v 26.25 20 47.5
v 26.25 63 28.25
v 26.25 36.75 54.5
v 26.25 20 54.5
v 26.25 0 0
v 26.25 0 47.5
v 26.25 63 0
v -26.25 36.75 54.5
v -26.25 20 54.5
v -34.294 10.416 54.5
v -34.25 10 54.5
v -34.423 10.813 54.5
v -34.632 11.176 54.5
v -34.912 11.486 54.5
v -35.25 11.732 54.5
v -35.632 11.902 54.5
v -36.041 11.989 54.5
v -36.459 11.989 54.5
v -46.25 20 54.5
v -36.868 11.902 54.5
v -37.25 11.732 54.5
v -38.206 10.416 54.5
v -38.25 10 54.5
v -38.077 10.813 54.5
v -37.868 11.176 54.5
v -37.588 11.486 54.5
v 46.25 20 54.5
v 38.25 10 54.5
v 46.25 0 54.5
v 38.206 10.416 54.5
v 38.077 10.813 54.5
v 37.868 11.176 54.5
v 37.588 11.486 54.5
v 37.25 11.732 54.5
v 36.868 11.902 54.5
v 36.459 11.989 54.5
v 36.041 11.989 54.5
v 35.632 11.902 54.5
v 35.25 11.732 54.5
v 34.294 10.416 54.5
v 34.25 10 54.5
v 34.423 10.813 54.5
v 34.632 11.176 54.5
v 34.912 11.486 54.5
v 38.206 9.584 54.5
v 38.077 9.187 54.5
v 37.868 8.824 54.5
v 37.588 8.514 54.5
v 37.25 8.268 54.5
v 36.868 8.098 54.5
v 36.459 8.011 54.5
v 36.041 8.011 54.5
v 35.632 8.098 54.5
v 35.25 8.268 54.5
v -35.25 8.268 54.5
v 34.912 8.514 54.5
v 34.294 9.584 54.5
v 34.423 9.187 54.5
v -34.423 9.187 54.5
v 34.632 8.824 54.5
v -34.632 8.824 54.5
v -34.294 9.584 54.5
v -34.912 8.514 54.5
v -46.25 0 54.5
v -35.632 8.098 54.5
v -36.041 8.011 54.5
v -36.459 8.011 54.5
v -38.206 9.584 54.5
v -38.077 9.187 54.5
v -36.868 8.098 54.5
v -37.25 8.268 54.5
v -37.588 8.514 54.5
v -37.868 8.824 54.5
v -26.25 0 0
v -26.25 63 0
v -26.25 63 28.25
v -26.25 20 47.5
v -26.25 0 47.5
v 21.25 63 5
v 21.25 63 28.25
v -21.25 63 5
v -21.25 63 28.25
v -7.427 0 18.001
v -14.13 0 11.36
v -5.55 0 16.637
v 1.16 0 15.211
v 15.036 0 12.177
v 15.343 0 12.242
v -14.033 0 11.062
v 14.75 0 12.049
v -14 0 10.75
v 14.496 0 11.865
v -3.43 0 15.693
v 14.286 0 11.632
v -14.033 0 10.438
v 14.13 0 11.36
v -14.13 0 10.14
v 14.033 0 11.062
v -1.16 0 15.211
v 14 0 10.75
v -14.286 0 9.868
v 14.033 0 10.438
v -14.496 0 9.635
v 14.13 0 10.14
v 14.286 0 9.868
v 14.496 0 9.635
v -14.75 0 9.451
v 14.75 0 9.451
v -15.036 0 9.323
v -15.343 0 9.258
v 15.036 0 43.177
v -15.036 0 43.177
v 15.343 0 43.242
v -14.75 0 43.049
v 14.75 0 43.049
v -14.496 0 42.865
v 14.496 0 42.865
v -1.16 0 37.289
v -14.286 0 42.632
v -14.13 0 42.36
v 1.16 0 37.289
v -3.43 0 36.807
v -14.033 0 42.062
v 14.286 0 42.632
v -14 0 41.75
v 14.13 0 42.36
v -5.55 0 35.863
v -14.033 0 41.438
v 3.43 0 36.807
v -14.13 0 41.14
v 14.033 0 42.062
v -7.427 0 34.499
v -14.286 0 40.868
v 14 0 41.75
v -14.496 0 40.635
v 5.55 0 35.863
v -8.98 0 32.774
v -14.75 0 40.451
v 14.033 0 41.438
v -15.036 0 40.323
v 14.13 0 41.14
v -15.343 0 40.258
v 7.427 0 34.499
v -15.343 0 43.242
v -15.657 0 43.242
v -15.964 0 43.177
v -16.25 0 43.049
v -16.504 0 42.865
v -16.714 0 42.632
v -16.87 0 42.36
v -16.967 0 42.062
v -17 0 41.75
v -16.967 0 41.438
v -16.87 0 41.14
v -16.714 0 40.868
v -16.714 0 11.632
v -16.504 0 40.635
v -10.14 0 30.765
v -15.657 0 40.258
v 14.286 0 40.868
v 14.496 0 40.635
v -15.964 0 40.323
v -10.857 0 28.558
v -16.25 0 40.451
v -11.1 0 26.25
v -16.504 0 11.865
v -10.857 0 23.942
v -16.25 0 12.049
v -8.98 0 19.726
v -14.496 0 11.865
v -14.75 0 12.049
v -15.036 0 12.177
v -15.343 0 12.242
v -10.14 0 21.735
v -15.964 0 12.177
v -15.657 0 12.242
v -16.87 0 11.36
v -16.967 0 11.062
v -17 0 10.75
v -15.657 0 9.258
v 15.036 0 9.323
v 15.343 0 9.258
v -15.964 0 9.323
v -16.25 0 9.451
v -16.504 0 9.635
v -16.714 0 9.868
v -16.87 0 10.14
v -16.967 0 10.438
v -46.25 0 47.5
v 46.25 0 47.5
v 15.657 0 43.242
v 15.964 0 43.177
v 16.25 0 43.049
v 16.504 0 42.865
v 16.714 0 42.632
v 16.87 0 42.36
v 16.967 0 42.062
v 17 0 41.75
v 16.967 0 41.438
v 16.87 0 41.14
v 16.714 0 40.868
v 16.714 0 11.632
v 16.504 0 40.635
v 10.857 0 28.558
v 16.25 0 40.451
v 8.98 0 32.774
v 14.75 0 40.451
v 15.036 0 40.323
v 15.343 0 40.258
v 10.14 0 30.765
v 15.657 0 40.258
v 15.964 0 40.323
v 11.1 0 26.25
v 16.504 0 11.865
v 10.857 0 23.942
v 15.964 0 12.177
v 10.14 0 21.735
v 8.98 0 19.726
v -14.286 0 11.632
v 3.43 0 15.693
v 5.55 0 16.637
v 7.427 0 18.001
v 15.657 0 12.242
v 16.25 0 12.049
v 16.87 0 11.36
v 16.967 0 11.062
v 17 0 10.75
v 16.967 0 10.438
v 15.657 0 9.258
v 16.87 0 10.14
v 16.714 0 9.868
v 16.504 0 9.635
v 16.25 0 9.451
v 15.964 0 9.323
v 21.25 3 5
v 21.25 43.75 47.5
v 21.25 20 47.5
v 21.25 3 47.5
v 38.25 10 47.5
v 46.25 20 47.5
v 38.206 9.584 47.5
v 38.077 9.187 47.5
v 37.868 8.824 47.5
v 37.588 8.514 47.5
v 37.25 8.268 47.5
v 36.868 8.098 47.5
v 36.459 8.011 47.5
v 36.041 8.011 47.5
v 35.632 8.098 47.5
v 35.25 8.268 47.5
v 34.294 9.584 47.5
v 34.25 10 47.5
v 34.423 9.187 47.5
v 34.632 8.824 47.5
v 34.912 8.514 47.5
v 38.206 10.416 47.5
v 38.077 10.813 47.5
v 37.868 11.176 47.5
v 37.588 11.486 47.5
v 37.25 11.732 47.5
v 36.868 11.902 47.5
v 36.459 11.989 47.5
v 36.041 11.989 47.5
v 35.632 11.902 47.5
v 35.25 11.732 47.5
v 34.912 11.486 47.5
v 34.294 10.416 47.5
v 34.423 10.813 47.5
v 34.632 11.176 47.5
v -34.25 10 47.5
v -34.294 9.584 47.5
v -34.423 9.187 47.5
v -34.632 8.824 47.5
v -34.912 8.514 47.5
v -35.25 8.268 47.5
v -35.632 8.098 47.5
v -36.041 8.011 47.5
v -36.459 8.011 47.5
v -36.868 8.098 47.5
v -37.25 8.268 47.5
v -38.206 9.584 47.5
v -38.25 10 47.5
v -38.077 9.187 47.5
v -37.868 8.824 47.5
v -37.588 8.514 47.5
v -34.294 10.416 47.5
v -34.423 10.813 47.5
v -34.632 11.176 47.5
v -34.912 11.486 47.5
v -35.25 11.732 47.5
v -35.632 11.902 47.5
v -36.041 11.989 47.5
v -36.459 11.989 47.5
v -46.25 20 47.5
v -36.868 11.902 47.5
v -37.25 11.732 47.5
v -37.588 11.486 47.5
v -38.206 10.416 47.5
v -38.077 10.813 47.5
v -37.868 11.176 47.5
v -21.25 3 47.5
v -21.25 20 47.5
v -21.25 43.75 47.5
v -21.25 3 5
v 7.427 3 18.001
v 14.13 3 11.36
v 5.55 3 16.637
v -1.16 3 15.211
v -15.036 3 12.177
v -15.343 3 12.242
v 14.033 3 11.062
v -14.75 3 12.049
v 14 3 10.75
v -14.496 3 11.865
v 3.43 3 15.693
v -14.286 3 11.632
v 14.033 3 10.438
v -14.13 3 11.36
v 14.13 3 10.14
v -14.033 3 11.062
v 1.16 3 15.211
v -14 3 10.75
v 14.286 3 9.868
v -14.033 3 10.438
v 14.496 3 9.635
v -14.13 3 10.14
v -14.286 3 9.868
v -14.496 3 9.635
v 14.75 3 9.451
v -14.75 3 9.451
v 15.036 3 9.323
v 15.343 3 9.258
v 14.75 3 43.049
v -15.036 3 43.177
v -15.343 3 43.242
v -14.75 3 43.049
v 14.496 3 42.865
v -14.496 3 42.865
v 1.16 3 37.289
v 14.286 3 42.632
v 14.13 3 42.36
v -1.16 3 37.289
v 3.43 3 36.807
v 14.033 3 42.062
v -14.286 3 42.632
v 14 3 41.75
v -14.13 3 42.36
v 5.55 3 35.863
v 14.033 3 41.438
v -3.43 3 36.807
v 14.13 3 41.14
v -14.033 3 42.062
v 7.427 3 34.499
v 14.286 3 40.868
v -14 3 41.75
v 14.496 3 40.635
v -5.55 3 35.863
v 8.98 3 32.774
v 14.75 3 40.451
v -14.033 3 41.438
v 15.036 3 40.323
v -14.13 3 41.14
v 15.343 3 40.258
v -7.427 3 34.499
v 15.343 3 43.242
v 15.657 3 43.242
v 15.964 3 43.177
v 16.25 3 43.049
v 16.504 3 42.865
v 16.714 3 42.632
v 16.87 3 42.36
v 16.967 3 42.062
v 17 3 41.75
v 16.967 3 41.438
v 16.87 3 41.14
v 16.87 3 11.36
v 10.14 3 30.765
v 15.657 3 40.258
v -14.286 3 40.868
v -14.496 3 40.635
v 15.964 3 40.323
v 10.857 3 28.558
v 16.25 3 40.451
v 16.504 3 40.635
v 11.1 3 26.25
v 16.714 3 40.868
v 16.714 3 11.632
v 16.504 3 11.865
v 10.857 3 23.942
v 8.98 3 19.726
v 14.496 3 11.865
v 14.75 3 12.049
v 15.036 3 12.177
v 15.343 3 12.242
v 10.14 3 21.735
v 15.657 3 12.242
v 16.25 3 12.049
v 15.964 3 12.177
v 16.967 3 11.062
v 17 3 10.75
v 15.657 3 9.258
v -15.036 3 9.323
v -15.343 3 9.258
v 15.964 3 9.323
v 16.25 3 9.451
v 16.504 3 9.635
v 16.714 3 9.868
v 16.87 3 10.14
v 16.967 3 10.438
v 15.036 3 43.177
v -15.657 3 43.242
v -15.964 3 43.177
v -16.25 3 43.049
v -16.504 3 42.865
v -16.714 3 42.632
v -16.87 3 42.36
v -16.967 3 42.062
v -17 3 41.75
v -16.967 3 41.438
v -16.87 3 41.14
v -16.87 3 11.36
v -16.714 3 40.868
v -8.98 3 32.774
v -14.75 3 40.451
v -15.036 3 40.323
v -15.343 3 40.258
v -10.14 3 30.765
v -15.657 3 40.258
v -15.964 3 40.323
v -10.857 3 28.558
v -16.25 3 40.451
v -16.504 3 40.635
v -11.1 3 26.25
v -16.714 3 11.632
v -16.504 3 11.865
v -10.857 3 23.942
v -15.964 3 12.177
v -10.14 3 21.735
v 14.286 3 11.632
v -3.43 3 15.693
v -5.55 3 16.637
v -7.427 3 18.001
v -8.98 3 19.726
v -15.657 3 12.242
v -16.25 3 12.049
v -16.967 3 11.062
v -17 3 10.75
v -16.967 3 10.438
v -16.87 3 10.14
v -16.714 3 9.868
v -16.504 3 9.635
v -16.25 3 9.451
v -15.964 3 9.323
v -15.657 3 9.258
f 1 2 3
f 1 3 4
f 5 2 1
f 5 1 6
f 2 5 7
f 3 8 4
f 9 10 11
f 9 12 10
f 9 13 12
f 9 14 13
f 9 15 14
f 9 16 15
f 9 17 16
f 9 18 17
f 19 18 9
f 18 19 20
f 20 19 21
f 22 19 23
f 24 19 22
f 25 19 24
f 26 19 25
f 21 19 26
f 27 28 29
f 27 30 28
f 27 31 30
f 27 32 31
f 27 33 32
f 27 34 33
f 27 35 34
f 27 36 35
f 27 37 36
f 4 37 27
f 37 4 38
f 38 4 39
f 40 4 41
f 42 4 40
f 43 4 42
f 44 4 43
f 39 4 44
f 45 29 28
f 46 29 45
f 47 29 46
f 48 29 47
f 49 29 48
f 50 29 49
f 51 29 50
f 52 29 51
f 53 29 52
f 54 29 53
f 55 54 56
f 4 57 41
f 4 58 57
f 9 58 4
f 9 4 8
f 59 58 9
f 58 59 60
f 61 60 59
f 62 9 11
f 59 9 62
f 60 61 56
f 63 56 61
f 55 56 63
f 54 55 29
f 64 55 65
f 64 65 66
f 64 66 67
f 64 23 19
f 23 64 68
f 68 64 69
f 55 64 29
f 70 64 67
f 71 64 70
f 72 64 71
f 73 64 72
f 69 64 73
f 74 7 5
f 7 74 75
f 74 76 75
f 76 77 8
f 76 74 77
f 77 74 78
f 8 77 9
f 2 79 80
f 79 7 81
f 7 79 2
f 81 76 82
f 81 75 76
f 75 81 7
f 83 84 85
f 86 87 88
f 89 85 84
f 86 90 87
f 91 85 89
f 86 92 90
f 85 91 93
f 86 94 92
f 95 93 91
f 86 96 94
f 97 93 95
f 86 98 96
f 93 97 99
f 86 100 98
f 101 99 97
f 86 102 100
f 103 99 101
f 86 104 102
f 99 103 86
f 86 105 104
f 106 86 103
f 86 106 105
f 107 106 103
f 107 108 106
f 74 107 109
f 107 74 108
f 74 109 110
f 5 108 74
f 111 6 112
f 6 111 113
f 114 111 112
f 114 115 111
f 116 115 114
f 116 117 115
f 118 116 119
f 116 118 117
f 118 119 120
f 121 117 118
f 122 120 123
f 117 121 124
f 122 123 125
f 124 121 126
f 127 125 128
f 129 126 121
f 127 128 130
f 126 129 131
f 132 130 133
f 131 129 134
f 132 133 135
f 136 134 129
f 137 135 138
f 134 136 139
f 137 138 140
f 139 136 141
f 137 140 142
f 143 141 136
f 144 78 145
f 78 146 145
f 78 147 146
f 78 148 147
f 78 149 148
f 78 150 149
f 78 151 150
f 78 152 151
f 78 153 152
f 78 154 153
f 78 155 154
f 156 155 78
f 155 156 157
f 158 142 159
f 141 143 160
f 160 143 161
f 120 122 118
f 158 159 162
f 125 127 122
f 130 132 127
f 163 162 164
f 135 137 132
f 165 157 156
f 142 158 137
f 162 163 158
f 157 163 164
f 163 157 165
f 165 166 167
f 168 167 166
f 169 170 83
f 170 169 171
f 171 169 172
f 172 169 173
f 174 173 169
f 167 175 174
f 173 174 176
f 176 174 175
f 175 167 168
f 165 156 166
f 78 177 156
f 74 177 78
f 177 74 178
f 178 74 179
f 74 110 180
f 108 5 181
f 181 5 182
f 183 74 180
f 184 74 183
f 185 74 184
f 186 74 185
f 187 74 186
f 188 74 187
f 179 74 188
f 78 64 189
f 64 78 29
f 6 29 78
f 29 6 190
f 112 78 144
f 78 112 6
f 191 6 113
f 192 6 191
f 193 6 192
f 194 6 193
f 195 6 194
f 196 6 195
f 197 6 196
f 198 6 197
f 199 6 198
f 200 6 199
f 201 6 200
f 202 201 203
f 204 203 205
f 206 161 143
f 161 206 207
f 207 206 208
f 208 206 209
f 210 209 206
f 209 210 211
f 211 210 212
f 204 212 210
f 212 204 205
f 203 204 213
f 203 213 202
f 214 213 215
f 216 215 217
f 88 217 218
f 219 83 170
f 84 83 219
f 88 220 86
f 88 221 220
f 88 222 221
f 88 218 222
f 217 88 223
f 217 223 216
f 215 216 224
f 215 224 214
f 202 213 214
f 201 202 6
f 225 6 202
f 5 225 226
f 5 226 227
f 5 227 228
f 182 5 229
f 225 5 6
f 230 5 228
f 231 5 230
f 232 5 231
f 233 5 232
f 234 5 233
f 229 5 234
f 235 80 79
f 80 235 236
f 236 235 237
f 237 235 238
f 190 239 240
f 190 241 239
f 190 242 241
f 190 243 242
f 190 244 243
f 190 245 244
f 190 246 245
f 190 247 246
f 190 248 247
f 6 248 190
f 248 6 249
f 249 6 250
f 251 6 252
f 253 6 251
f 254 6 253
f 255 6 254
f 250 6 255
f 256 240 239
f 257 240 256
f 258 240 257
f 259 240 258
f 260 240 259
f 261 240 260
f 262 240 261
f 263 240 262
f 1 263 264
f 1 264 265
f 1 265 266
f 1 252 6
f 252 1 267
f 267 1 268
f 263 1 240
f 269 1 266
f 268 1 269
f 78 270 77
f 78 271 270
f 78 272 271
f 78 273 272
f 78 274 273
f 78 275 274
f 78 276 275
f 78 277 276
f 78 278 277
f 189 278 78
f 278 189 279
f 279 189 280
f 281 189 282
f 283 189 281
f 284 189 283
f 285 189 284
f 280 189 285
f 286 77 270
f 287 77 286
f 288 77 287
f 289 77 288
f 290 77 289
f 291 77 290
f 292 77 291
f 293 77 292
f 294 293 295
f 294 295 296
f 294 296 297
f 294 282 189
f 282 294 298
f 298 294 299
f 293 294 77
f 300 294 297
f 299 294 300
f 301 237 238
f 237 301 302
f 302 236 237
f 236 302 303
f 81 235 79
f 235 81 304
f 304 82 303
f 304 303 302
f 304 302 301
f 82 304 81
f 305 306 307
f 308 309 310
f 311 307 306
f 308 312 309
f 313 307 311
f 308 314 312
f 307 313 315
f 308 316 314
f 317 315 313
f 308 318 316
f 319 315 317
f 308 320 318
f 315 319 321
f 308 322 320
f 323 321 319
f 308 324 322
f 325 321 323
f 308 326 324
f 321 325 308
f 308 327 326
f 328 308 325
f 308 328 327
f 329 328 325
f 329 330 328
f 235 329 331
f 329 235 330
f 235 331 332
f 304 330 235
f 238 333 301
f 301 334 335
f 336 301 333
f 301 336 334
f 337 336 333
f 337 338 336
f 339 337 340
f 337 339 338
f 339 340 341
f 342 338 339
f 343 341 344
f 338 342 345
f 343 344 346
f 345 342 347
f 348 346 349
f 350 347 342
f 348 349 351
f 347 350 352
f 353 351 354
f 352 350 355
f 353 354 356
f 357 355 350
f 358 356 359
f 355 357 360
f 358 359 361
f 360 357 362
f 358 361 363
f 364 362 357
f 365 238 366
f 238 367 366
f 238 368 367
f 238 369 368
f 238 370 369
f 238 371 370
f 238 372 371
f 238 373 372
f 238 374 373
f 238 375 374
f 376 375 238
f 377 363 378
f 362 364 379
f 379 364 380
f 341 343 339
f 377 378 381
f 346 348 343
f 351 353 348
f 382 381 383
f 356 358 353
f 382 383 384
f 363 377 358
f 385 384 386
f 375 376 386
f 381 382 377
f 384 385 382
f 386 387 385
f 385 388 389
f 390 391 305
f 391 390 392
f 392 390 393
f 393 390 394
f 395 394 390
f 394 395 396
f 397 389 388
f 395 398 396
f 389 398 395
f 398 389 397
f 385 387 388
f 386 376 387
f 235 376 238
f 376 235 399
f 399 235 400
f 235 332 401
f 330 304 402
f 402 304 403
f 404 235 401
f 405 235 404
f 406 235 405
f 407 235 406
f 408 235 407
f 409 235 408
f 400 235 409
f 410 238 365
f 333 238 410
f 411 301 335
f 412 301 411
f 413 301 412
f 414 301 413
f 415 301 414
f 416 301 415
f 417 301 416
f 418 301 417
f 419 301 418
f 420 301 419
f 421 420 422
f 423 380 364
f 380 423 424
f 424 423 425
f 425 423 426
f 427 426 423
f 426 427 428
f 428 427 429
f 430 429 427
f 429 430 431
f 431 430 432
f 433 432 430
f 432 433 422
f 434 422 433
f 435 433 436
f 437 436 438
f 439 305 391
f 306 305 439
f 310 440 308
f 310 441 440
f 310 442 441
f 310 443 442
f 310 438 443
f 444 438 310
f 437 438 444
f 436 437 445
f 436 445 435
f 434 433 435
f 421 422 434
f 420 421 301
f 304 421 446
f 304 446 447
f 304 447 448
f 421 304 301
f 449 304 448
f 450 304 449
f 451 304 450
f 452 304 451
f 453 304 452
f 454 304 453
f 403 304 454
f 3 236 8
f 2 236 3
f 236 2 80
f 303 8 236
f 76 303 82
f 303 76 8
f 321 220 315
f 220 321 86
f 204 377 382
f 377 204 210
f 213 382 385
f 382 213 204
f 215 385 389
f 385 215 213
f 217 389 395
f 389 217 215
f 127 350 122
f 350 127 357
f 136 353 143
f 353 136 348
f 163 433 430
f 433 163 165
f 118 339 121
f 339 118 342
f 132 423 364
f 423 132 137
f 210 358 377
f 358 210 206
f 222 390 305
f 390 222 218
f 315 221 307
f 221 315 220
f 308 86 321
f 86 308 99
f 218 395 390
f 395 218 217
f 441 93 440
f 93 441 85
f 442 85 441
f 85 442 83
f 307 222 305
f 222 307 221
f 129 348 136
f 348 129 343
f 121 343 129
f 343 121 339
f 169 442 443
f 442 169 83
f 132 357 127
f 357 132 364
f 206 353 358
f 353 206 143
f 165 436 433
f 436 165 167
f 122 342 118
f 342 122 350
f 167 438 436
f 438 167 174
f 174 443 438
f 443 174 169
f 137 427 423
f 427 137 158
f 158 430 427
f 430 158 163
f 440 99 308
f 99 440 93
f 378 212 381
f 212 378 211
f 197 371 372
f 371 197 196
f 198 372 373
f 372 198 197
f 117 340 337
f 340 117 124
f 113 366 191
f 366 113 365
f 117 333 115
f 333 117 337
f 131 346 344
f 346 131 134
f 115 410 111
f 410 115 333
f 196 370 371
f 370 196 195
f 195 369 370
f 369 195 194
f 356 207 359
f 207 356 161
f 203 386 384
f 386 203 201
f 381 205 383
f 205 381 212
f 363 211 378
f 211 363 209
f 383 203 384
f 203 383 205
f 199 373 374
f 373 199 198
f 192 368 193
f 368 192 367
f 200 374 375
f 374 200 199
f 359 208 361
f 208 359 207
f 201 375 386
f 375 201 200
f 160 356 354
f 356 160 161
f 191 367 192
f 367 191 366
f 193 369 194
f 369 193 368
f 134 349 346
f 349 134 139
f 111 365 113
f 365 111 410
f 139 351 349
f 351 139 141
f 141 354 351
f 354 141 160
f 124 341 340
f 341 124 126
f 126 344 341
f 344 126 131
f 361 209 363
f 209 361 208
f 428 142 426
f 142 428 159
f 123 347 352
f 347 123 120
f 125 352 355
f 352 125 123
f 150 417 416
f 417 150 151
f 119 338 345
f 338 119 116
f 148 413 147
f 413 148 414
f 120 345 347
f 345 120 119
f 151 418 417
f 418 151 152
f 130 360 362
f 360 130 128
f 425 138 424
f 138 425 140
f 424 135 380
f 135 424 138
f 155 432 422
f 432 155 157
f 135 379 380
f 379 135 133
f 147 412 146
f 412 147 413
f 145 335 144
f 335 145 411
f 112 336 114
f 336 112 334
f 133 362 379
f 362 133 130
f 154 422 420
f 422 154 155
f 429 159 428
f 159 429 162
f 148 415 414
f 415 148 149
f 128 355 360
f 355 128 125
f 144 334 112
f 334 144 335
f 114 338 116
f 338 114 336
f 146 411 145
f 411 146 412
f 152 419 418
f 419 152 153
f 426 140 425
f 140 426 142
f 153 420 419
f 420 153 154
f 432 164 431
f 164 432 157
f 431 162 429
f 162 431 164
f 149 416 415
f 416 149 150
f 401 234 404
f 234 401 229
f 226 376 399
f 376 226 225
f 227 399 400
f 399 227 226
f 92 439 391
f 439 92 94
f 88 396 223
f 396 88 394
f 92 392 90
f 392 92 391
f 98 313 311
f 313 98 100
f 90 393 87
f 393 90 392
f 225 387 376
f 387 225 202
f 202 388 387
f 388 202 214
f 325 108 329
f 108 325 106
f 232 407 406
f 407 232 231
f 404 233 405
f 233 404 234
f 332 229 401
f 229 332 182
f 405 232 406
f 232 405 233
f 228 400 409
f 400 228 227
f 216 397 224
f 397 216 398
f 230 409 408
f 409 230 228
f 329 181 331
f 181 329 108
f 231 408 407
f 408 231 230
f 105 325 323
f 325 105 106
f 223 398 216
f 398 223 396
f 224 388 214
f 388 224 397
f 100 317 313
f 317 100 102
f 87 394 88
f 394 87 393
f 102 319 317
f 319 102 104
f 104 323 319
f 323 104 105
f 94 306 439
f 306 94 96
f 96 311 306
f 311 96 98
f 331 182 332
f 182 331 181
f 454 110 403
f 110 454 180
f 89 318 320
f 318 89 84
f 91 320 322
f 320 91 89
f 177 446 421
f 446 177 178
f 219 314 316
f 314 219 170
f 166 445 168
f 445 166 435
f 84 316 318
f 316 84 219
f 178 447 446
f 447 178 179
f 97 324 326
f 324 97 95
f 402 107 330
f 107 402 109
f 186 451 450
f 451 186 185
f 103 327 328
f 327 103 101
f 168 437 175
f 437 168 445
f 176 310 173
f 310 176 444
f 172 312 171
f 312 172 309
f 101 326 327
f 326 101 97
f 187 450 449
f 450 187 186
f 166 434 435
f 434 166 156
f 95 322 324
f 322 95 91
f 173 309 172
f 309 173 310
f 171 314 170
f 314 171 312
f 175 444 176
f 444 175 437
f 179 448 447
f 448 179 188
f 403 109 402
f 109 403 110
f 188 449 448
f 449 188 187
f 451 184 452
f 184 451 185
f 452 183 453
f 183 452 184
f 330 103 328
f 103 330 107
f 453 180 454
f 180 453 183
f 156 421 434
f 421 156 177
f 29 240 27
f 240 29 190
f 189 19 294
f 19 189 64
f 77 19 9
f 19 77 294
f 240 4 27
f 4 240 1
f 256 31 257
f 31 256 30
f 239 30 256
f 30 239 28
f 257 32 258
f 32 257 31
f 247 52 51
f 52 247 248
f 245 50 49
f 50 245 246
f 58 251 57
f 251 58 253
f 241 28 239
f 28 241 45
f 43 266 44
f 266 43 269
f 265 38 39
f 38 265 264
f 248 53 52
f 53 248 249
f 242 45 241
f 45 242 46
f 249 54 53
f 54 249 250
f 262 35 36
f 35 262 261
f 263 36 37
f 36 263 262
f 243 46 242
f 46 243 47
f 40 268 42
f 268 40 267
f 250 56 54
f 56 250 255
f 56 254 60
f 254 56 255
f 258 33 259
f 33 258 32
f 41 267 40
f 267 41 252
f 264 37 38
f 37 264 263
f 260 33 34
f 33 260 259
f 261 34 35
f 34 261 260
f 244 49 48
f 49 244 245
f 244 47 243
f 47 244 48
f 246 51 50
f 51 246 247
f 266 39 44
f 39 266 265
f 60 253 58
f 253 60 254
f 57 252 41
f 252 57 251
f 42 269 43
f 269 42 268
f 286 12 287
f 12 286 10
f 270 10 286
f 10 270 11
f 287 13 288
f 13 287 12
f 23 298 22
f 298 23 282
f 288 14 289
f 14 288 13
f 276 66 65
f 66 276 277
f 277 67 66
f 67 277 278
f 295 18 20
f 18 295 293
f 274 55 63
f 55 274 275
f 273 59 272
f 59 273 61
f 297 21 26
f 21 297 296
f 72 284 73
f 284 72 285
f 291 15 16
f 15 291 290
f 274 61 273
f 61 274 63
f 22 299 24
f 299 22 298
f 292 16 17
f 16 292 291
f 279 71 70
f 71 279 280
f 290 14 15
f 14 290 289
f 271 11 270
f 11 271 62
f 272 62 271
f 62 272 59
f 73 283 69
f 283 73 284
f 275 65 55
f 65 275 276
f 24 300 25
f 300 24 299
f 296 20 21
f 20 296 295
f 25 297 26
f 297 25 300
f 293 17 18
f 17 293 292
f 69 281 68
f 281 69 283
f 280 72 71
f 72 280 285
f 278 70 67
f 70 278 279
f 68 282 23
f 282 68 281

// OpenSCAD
// E3D Titan mount
// Ryan Crosby 2019
//
// All units are in mm

//
// Constants
//

// Floating point errors can cause difference operations to leave really thin faces where there should be none.
// Add this to subtracted object dimensions where appropriate to prevent this.
SUBSTRACT_ERROR_MARGIN = 0.0001;

//
// Variables
//
        
// The front spacing between the motor and extruder. Tweak this depending on the length of the axle and flat edge of your stepper motor.
// See the E3D setup guide for hints on what this should be, ultimately your metal gear needs to be able to sit on the motor shaft such that the top surface is flush with the larger plastic gear top surface.
// The metal gear's grub screw should be closer to the motor so that the grub screw's hole doesn't mesh with and wear the plastic gear. The grub screw should ideally also screw down to the milled flat section of the stepper motor.
// Somewhere between 2-5mm should probably do it.
front_spacing = 3;

// The thickness of the supporting walls surrounding the stepper motor. Increase for more strength.
wall_thickness = 5;

// The stepper motor dimensions.
// Nema17 are 42.3 x 42.3 x depth
// Circle round motor axle is 22mm+-0.05mm
// Mounting holes are 31mm+-0.1mm apart
stepper_edge = 42.5; // 42.3mm with 0.2mm tolerence
// Change this to match the depth of your stepper motor
stepper_depth = 60;
stepper_circle_radius = 11.1; // 22mm diameter 0.2mm tolerence
stepper_screw_spacing = 31;
// Increase radius if holes are too tight
stepper_screw_radius = 1.5;

// Mount parameters
//
// Thickness of the mount. Increase for longer screws and higher strength.
// This also changes the thickness of the box roof.
mount_thickness = 7;
// Width of the mount
mount_width = stepper_edge + 50;
// Usually set the mounting depth to the width of your extrusion.
// 20mm for System 20 T slot.
mount_depth = 20;
// Offset from the front of the stepper.
// Increase this to move the mount backwards.
// This reduces torque when using a longer, heavier stepper motor.
// Set to 0 for support-free printing.
mount_offset_depth = 0;
// Offset from the front of the mount where the center of the screw hole will be located.
// Usually half the width of your extrusion, 10mm for System 20 T slot.
mount_screw_spacing_front = 20 / 2; // System 20 extrusion
mount_hole_spacing_side = 20 / 2;
// Increase radius if holes are too tight
mount_hole_radius = 2;


// The dimensions for the outer edges of the main box.
box_width = stepper_edge + 2 * wall_thickness;
box_height = stepper_edge + wall_thickness + mount_thickness;
box_depth = stepper_depth + front_spacing;

// Controls the triangular prism cutout on the end of the main box.
//
// The depth of the top edge.
// Must be big enough for connectors, may be larger for cooling.
cutout_depth_max = stepper_edge / 2 + wall_thickness;
cutout_depth_min = box_depth - (mount_depth + mount_offset_depth);

cutout_depth = min(cutout_depth_max, cutout_depth_min);
// The height of the prism. Can be smaller for more strength, larger for more cooling.
cutout_height = stepper_edge / 2 + wall_thickness;

//
// Modules
//

// Triangular prism
module prism(l, w, h){
       polyhedron(
               points=[[0,0,0], [l,0,0], [l,w,0], [0,w,0], [0,w,h], [l,w,h]],
               faces=[[0,1,2,3],[5,4,3,2],[0,4,5,1],[0,3,4],[5,2,1]]
               );
}

module hole(r, h) {
    cylinder(h = h + 2 * SUBSTRACT_ERROR_MARGIN, r1 = r, r2 = r, center = true, $fs = 0.1);
}

//
// Part
//

difference() {
    // Create main mounting box
    translate([-box_width / 2, 0, 0])
    difference() {
        // The outer surround
        cube([box_width, box_depth, box_height]);

        // Subtract space for the stepper motor
        translate([wall_thickness, front_spacing, wall_thickness])    
        cube([stepper_edge, stepper_depth, stepper_edge]);
        
        // The diagonal cut-out, for connectors
        rotate([0,180,0])
        translate([-box_width - SUBSTRACT_ERROR_MARGIN, box_depth - cutout_depth + SUBSTRACT_ERROR_MARGIN, -box_height - SUBSTRACT_ERROR_MARGIN])
        prism(box_width + 2 * SUBSTRACT_ERROR_MARGIN, cutout_depth, cutout_height);
    }

    // Cut out stepper motor hole 
    translate([0, front_spacing / 2 + SUBSTRACT_ERROR_MARGIN, stepper_edge / 2 + wall_thickness])
    rotate([90, 0, 0])
    hole(stepper_circle_radius, front_spacing);
    
    // Cut out the four stepper mounting holes
    translate([stepper_screw_spacing / 2, front_spacing / 2 + SUBSTRACT_ERROR_MARGIN, stepper_screw_spacing / 2 + stepper_edge / 2 + wall_thickness])
    rotate([90, 0, 0])
    hole(stepper_screw_radius, front_spacing);
    
    translate([-stepper_screw_spacing / 2, front_spacing / 2 + SUBSTRACT_ERROR_MARGIN, stepper_screw_spacing / 2 + stepper_edge / 2 + wall_thickness])
    rotate([90, 0, 0])
    hole(stepper_screw_radius, front_spacing);
    
    translate([stepper_screw_spacing / 2, front_spacing / 2 + SUBSTRACT_ERROR_MARGIN, -stepper_screw_spacing / 2 + stepper_edge / 2 + wall_thickness])
    rotate([90, 0, 0])
    hole(stepper_screw_radius, front_spacing);
    
    translate([-stepper_screw_spacing / 2, front_spacing / 2 + SUBSTRACT_ERROR_MARGIN, -stepper_screw_spacing / 2 + stepper_edge / 2 + wall_thickness])
    rotate([90, 0, 0])
    hole(stepper_screw_radius, front_spacing);
}


difference() {
    // Mount for the extrusion
    translate([-mount_width / 2, mount_offset_depth, stepper_edge + wall_thickness])
    cube([mount_width, mount_depth, mount_thickness]);
    
    // Cut out the mounting holes
    translate([mount_width / 2 - mount_hole_spacing_side, mount_offset_depth + mount_screw_spacing_front, stepper_edge + wall_thickness + mount_thickness / 2 - SUBSTRACT_ERROR_MARGIN])
    hole(mount_hole_radius, mount_thickness);
    
    translate([-mount_width / 2 + mount_hole_spacing_side, mount_offset_depth + mount_screw_spacing_front, stepper_edge + wall_thickness + mount_thickness / 2 - SUBSTRACT_ERROR_MARGIN])
    hole(mount_hole_radius, mount_thickness);
}
